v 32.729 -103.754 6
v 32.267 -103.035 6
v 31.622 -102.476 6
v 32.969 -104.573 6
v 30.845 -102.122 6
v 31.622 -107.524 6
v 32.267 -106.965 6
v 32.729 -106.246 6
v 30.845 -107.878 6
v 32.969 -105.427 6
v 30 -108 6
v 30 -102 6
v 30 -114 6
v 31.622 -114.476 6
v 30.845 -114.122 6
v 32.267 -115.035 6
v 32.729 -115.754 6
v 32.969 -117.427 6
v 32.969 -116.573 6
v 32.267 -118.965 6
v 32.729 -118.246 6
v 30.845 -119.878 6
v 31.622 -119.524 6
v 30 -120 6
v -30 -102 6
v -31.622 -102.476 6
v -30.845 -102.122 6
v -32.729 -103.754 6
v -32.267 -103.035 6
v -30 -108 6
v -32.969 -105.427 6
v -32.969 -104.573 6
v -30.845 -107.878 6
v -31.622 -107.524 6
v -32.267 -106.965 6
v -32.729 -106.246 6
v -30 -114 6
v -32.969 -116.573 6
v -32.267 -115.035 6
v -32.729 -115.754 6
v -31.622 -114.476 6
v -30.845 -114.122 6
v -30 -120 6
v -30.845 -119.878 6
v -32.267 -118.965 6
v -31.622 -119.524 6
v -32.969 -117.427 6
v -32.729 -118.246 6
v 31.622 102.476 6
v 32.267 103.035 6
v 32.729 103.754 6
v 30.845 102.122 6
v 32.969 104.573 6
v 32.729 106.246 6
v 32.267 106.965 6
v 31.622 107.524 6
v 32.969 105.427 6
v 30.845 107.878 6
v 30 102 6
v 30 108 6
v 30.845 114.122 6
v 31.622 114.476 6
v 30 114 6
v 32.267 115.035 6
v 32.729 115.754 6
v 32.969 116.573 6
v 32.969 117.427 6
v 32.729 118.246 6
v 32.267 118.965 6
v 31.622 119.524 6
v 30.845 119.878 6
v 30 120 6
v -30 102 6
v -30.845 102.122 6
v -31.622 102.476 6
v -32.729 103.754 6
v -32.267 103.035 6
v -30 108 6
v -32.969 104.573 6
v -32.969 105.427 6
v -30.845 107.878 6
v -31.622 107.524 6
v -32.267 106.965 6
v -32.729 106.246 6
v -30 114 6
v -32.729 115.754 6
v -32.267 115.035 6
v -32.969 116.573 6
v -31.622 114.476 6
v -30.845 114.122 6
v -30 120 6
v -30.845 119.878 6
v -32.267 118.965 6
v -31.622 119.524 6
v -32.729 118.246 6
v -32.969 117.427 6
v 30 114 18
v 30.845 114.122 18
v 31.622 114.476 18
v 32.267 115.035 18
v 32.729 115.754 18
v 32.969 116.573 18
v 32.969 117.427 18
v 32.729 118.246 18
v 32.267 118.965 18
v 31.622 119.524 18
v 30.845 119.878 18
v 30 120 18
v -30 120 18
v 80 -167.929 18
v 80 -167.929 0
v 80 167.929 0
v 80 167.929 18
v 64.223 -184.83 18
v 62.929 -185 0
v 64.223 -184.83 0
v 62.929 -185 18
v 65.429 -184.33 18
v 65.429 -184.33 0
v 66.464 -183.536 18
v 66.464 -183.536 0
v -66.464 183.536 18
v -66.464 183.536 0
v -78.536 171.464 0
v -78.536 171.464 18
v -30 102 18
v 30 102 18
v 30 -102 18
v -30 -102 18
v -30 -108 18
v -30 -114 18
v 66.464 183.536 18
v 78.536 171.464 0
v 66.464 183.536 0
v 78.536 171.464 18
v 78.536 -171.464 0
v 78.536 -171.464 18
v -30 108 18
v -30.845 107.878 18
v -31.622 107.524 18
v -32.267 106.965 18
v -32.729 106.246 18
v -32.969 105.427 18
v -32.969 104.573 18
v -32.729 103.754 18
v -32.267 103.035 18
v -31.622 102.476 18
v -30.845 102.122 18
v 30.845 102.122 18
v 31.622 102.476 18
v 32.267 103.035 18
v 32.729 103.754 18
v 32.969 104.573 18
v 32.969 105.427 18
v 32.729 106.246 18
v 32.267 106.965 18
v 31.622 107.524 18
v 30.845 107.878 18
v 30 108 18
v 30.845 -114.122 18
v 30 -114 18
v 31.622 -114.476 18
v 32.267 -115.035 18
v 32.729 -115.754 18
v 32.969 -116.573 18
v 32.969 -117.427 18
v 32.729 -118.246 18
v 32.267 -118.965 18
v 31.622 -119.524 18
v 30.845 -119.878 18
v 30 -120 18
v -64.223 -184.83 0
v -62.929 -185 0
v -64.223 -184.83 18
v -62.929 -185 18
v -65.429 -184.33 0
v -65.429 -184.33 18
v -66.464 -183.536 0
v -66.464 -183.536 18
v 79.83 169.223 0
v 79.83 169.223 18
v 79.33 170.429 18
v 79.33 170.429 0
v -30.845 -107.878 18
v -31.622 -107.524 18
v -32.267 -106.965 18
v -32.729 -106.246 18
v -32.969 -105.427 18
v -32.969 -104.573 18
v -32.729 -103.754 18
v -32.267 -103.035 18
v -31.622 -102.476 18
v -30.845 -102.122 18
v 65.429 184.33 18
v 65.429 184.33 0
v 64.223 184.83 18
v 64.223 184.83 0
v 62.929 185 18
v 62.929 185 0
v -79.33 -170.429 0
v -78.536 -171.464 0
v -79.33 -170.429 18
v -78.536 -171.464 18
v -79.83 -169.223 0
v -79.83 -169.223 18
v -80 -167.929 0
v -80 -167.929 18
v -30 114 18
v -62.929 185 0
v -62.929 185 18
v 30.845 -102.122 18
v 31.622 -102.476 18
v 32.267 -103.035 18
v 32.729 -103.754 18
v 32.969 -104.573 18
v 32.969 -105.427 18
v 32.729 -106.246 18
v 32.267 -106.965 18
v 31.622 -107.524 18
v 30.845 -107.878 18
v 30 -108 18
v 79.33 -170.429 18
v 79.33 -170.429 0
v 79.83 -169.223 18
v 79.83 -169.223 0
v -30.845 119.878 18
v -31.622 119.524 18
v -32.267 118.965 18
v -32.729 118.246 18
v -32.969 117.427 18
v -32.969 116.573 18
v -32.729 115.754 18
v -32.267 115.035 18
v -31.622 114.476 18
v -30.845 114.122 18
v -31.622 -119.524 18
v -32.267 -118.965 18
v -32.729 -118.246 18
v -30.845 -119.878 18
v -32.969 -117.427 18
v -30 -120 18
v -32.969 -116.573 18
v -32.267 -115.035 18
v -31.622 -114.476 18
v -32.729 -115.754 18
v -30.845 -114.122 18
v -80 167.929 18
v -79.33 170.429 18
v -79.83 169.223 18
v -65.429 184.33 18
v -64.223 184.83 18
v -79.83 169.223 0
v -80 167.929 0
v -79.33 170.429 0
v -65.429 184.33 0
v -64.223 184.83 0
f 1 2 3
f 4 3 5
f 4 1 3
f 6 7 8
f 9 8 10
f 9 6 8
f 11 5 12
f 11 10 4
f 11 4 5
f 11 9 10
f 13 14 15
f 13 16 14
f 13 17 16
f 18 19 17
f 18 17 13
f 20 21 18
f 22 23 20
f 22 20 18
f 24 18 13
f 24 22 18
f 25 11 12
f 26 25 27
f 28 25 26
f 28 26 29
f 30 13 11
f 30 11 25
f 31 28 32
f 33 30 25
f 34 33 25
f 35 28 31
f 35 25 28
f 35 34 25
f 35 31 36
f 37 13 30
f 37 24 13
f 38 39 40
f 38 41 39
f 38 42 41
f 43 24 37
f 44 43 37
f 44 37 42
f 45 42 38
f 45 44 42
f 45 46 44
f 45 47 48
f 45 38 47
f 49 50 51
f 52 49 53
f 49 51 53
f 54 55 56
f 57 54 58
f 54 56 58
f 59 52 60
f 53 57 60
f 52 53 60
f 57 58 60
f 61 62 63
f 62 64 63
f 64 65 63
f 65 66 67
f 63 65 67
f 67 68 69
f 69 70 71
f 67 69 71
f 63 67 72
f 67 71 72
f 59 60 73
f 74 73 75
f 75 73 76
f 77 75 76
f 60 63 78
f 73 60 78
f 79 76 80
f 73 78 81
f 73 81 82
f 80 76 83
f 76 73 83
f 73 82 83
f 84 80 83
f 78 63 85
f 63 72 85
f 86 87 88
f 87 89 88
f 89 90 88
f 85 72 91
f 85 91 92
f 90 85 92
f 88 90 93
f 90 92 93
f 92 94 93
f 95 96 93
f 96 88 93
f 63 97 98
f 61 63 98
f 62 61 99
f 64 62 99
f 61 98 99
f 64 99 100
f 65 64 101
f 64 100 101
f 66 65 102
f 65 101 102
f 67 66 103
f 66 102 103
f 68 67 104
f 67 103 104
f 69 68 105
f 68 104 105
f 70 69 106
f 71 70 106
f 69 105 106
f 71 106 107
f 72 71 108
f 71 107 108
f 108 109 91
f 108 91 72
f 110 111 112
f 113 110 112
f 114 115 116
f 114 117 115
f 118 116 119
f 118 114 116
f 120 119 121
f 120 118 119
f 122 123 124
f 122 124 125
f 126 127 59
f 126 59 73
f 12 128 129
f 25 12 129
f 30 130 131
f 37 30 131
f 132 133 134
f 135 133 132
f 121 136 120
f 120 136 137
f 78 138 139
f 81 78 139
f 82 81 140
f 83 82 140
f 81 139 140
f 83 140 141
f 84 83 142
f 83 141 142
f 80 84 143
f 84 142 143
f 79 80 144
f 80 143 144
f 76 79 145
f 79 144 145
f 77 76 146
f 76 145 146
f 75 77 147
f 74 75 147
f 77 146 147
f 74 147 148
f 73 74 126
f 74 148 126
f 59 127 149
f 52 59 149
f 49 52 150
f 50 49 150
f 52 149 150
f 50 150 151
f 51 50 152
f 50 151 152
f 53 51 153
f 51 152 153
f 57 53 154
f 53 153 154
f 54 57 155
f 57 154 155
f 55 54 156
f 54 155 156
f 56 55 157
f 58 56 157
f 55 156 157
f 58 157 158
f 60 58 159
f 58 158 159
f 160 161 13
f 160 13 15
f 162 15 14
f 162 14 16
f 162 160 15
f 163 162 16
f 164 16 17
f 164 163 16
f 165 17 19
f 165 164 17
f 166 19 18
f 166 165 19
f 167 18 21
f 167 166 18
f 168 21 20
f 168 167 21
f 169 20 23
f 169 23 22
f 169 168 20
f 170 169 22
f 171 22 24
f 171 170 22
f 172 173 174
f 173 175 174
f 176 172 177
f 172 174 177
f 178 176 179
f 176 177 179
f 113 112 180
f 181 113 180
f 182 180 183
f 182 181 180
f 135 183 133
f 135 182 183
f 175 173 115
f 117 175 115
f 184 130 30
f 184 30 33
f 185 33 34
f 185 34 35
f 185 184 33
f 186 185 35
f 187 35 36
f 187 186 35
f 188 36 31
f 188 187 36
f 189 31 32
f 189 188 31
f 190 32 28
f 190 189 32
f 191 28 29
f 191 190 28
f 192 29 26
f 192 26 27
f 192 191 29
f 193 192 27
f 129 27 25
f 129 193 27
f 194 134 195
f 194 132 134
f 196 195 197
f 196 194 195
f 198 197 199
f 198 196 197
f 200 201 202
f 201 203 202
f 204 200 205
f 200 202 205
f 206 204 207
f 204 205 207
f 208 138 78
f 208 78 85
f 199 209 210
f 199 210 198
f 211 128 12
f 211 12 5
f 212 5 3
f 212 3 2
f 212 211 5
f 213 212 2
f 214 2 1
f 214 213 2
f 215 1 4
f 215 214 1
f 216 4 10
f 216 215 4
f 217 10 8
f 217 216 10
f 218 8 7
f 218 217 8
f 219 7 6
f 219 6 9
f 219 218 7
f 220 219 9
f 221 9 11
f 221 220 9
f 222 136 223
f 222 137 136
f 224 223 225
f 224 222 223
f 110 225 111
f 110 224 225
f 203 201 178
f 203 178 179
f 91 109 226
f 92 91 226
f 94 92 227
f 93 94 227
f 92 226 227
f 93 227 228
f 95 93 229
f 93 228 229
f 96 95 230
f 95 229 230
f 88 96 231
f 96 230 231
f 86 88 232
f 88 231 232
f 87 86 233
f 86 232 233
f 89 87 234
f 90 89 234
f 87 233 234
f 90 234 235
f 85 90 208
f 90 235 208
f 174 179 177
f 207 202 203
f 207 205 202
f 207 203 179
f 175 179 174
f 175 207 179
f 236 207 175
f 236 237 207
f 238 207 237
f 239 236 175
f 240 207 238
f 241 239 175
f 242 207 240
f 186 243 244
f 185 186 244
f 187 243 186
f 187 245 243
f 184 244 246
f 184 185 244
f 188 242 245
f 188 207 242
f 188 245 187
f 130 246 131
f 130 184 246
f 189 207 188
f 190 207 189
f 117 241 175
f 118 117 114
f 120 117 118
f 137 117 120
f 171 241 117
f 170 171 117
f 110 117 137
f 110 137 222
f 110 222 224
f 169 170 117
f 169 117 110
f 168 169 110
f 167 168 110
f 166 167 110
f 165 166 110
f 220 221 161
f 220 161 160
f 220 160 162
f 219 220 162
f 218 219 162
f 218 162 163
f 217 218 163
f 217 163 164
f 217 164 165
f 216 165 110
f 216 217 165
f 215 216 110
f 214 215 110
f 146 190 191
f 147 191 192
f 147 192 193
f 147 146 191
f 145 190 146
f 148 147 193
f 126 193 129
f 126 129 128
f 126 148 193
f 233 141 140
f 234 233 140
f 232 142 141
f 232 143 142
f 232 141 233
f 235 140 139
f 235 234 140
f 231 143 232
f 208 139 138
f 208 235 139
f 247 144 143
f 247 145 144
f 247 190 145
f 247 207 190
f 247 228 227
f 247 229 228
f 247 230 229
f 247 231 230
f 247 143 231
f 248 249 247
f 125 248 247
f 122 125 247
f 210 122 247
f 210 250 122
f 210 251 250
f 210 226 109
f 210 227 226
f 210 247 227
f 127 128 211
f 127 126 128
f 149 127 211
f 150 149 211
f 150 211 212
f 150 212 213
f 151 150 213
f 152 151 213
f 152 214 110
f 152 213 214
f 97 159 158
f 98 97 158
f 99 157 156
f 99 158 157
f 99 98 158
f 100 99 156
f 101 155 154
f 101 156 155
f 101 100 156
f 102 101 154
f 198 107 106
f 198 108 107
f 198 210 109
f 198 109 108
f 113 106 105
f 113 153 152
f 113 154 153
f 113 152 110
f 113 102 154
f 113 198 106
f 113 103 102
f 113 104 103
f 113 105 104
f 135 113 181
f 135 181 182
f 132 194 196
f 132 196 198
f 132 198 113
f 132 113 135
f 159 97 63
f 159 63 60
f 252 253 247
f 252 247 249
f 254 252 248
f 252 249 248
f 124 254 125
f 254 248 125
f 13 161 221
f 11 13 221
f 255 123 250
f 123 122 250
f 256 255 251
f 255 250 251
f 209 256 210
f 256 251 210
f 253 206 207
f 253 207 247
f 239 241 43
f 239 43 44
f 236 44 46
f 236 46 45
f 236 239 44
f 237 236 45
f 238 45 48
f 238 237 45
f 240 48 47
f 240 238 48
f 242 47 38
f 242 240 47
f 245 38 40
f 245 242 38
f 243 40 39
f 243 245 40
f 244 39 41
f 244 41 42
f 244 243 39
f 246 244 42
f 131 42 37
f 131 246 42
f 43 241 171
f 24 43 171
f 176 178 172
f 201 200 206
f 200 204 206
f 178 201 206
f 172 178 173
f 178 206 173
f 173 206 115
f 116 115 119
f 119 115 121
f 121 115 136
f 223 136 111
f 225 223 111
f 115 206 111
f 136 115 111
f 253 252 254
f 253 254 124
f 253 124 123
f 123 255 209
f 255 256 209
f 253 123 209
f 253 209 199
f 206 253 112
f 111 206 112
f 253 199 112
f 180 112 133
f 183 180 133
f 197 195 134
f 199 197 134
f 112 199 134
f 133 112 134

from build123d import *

# Parameters (mm, degrees)
SKETCH_W        = 160
SKETCH_H        = 370
PAD_DEPTH       = 18
POCKET_DEPTH    = 12
CHAMFER_SIZE    = 15
CHAMFER001_SIZE = 15
CHAMFER002_SIZE = 15
FILLET_R        = 5


with BuildPart() as part:
    # Sketch → Pad (new body)
    with BuildSketch(Plane.XY):
        Rectangle(SKETCH_W, SKETCH_H)
    extrude(amount=PAD_DEPTH)

    # Sketch001 → Pocket (cut)
    with BuildSketch(Plane.XY.offset(18)):
        with BuildLine():
            Line((-30, 120), (30, 120))
            ThreePointArc((30, 114), (33, 117), (30, 120))
            Line((30, 114), (30, 108))
            ThreePointArc((30, 102), (33, 105), (30, 108))
            Line((30, 102), (-30, 102))
            ThreePointArc((-30, 108), (-33, 105), (-30, 102))
            Line((-30, 108), (-30, 114))
            ThreePointArc((-30, 120), (-33, 117), (-30, 114))
        make_face()
    pocket = extrude(amount=-POCKET_DEPTH, mode=Mode.SUBTRACT)

    # Mirrored: Pocket across Sketch001 H_Axis
    add(pocket.mirror(Plane(origin=(0, 0, 18), x_dir=(0, 0, 1), z_dir=(0, 1, 0))), mode=Mode.SUBTRACT)

    # Chamfer
    chamfer_edges = [part.edges().sort_by_distance(p)[0] for p in [
        (-80, 185, 9),
    ]]
    chamfer(chamfer_edges, length=CHAMFER_SIZE)

    # Chamfer001
    chamfer001_edges = [part.edges().sort_by_distance(p)[0] for p in [
        (80, 185, 9),
        (80, -185, 9),
    ]]
    chamfer(chamfer001_edges, length=CHAMFER001_SIZE)

    # Chamfer002
    chamfer002_edges = [part.edges().sort_by_distance(p)[0] for p in [
        (-80, -185, 9),
    ]]
    chamfer(chamfer002_edges, length=CHAMFER002_SIZE)

    # Fillet
    fillet_edges = [part.edges().sort_by_distance(p)[0] for p in [
        (-80, -170, 9),
        (-65, -185, 9),
        (-80, 170, 9),
        (-65, 185, 9),
        (65, 185, 9),
        (80, 170, 9),
        (80, -170, 9),
        (65, -185, 9),
    ]]
    fillet(fillet_edges, radius=FILLET_R)


solid = part.part
